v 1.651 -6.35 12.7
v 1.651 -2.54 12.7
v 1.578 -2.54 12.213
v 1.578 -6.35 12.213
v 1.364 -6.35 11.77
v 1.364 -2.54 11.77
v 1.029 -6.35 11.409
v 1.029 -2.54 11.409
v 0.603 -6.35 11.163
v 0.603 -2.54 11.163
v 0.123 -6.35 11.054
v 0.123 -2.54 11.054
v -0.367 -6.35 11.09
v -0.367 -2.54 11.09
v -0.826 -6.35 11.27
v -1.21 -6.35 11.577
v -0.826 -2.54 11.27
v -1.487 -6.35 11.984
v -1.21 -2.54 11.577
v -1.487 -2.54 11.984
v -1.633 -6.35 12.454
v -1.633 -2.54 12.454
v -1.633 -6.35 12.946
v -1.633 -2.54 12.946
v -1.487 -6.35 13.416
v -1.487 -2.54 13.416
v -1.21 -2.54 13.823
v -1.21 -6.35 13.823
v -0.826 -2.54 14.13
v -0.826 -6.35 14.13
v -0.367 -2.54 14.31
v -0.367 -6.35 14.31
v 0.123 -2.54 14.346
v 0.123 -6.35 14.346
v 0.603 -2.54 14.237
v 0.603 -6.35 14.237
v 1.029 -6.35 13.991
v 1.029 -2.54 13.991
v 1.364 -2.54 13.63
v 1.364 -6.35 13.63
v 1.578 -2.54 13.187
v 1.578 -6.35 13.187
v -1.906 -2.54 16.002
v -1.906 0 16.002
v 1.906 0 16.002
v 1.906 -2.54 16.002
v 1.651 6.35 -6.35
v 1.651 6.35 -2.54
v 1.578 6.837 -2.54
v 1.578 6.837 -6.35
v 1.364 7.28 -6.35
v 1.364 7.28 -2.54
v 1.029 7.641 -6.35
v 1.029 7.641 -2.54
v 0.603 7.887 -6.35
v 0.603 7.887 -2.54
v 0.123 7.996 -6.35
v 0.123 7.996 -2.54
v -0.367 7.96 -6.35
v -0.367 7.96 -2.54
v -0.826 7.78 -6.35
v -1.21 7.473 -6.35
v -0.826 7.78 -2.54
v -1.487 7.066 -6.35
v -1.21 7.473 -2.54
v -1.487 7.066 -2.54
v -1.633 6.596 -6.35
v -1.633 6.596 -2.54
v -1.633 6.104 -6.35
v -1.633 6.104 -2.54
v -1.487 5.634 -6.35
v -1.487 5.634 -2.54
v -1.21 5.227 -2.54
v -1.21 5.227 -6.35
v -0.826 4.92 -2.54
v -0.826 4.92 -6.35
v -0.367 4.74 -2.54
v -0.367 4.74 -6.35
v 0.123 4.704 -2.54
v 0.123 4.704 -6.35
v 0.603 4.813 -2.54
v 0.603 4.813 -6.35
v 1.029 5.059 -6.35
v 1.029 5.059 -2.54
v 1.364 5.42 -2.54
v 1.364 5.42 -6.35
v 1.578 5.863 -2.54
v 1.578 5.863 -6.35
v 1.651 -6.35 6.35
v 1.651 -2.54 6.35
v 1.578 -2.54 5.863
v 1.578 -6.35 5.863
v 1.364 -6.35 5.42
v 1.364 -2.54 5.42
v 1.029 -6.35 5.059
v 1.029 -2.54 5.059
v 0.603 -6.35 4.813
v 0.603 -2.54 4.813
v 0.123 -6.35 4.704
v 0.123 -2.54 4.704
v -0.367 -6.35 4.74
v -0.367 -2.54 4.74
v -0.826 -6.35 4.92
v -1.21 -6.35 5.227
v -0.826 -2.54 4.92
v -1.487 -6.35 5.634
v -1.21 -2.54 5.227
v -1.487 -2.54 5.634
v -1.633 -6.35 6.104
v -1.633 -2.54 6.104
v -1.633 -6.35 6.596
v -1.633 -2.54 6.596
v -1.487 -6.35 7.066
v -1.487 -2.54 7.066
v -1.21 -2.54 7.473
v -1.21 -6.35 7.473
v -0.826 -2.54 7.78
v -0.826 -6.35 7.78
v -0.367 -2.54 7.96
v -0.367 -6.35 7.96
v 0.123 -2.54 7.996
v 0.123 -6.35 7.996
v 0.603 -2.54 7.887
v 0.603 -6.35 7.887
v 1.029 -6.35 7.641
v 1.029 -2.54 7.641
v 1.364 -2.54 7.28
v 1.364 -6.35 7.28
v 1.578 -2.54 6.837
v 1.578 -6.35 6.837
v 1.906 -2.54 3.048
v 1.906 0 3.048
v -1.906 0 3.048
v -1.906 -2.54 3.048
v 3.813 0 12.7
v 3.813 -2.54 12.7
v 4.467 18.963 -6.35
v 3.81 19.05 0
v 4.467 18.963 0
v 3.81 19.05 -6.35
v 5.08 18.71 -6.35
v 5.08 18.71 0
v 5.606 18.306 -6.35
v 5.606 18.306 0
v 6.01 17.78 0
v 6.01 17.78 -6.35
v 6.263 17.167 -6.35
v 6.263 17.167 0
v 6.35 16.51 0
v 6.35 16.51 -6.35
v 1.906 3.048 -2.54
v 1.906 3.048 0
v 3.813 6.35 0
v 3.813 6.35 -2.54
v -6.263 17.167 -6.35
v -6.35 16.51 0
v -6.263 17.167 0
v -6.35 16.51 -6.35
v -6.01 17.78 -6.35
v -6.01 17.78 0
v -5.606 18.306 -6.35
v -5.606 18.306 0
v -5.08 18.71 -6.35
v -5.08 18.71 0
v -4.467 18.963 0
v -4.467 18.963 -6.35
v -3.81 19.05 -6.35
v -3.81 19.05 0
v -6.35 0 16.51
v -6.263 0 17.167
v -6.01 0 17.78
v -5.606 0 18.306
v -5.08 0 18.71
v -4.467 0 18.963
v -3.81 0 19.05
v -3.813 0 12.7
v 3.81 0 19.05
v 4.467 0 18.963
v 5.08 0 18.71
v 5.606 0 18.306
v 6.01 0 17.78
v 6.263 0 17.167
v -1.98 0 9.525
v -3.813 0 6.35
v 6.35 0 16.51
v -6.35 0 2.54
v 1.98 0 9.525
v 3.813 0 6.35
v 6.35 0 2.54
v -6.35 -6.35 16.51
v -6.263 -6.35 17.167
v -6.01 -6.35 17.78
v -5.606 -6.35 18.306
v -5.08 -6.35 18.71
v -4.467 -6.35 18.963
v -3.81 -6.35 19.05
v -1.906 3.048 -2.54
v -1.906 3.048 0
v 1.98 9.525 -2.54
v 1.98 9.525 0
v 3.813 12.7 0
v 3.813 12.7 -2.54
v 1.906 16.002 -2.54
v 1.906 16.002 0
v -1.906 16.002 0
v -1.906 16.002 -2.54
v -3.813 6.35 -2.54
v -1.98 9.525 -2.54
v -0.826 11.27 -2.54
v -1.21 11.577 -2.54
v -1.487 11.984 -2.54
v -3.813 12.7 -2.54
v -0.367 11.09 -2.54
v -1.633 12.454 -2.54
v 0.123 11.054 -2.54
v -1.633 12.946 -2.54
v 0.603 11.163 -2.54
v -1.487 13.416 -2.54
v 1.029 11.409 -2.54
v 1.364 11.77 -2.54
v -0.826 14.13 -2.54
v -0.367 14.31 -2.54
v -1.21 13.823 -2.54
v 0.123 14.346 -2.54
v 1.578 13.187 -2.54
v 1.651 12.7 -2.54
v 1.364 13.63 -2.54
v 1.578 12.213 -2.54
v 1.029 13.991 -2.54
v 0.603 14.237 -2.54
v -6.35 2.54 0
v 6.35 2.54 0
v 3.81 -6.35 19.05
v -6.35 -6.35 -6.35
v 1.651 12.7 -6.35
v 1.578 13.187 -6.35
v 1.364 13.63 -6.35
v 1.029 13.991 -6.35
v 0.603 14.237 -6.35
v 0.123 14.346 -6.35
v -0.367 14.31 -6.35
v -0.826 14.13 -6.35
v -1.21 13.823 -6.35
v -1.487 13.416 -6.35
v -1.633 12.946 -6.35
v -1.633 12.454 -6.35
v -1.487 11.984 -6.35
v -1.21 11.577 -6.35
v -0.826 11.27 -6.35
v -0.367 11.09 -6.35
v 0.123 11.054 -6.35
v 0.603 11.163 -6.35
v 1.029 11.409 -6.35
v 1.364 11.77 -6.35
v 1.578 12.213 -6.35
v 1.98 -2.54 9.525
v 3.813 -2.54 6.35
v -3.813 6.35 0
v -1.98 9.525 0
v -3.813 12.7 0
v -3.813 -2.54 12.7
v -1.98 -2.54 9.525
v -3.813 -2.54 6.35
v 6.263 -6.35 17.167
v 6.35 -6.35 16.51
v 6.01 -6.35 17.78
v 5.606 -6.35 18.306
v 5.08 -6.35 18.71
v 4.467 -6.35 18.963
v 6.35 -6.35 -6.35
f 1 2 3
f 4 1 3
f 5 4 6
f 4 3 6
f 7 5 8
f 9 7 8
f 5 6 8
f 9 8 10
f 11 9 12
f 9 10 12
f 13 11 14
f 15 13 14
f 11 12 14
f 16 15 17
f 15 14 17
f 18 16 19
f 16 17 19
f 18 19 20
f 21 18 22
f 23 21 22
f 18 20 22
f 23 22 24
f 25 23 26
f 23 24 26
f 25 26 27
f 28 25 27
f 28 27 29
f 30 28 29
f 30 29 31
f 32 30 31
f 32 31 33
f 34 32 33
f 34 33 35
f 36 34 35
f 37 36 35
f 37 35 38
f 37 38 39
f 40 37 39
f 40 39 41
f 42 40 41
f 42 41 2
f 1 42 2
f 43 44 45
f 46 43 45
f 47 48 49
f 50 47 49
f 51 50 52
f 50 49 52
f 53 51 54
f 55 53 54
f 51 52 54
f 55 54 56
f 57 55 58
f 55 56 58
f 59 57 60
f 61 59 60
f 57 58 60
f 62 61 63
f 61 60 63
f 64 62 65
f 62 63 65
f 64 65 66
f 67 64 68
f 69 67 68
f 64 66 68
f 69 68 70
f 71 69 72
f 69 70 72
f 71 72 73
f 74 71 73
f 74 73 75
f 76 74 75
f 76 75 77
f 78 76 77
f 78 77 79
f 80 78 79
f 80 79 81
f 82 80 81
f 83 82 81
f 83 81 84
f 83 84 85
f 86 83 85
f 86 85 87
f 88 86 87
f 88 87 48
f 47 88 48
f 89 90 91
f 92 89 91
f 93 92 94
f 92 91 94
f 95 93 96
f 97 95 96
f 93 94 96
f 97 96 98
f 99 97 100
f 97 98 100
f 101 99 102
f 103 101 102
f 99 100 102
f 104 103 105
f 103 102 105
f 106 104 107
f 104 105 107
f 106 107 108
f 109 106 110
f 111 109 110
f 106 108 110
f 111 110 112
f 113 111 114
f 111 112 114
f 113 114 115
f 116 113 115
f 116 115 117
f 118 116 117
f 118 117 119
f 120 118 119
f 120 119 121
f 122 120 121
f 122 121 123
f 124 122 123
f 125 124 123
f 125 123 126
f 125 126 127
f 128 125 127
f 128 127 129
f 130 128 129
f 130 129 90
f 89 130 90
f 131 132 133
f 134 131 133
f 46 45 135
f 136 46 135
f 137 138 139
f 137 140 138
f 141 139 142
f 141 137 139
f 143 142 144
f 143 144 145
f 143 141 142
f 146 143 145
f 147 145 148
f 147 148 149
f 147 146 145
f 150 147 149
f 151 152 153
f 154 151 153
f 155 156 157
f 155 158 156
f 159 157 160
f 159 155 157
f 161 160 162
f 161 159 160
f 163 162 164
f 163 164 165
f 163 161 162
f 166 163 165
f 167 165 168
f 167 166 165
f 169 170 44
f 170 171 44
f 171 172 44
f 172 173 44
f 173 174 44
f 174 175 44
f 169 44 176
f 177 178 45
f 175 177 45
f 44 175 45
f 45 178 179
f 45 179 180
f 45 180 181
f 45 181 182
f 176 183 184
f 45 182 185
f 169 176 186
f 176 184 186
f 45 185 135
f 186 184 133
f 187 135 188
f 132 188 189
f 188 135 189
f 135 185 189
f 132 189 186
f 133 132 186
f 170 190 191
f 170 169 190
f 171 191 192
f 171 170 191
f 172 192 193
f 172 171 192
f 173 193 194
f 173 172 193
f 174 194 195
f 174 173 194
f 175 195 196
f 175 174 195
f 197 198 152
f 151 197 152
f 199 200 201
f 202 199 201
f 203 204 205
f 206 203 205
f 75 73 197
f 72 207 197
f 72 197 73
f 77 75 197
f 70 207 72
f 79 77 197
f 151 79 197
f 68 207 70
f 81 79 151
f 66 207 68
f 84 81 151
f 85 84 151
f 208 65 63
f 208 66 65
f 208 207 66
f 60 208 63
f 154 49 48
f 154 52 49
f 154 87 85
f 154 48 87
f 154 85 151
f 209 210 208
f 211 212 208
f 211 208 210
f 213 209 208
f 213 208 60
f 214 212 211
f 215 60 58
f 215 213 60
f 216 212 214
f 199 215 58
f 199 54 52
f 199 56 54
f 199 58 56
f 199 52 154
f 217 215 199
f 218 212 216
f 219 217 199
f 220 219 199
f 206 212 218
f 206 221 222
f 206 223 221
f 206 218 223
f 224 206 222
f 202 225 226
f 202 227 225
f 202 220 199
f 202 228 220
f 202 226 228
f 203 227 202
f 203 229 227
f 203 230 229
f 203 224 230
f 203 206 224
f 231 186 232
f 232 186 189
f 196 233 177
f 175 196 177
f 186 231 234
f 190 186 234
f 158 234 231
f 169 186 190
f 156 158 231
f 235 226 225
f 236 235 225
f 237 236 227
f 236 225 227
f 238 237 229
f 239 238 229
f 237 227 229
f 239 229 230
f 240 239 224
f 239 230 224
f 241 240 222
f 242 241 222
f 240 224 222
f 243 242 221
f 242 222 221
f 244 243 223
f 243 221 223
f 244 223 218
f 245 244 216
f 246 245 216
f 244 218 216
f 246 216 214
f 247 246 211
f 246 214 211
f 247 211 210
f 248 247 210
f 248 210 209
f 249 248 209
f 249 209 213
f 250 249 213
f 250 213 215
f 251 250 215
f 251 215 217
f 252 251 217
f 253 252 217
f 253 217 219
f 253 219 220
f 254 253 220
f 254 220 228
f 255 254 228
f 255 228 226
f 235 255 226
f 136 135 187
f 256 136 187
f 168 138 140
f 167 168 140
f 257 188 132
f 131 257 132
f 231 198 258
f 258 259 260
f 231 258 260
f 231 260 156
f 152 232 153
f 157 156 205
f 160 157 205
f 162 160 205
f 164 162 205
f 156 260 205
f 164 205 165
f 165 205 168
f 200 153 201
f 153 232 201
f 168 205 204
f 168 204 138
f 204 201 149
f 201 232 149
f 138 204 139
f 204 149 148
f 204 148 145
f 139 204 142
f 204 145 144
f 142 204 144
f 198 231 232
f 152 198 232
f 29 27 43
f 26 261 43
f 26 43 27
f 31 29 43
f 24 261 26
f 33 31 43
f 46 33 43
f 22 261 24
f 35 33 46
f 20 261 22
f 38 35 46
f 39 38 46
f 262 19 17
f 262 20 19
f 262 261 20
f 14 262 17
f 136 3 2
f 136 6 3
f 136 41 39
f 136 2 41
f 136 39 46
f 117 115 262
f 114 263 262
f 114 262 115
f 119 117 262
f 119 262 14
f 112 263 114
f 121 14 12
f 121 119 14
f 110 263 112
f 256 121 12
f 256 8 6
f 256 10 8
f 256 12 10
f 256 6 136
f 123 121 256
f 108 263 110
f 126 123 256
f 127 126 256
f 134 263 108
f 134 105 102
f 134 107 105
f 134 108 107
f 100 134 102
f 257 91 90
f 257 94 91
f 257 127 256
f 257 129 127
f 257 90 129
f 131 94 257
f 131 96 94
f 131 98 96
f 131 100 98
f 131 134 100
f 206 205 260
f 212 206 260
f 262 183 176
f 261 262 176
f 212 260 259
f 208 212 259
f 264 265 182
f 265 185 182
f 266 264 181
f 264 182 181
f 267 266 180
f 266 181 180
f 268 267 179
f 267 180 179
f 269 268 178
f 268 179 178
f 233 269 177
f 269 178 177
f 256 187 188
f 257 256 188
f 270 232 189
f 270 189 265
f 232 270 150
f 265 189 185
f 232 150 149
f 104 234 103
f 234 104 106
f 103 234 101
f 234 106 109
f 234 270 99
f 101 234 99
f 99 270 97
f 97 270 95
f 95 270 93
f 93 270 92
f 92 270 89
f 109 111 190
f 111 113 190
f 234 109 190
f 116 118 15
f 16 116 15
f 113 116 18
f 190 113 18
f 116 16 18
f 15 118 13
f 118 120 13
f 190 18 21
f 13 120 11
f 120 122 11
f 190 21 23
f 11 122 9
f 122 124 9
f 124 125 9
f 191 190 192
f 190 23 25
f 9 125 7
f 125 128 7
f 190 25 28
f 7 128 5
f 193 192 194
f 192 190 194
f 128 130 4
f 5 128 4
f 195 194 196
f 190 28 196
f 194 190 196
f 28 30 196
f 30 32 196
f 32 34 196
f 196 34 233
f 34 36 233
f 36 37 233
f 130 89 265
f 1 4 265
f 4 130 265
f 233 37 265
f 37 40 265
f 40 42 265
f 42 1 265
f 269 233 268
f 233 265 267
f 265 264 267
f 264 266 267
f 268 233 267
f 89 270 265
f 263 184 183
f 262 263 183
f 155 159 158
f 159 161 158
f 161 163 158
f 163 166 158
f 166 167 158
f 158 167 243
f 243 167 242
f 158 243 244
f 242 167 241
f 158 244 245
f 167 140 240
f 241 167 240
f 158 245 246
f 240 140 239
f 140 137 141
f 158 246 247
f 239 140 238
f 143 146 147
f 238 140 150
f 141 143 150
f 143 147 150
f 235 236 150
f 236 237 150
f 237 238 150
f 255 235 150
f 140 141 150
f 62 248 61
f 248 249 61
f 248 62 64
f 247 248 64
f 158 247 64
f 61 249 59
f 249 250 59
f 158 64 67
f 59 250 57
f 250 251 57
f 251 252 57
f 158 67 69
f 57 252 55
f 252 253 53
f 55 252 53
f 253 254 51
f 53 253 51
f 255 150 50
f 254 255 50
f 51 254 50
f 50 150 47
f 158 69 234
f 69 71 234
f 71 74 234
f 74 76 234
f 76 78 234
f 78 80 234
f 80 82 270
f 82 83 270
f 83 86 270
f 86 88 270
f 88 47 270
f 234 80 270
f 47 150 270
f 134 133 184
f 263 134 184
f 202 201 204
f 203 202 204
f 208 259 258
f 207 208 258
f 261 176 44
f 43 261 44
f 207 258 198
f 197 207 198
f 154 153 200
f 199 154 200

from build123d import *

# Parameters (mm, degrees)
BOSS_EXTRUDE1_DEPTH      = 6.35
BOSS_EXTRUDE1_DEPTH_BACK = 6.35
SKETCH2_R                = 1.651
CUT_EXTRUDE1_DEPTH       = 25.4
CUT_EXTRUDE2_DEPTH       = 2.54
SKETCH4_R                = 1.651
CUT_EXTRUDE3_DEPTH       = 6.35
CUT_EXTRUDE4_DEPTH       = 2.54
CHAMFER1_SIZE            = 2.54
FILLET1_R                = 2.54


with BuildPart() as part:
    # Sketch1 → Boss-Extrude1 (new, two sides: drawn at the far end of the back side and taken through both)
    with BuildSketch(Plane(origin=(0, 0, 0), x_dir=(0, 0, -1), z_dir=(1, 0, 0)).offset(-BOSS_EXTRUDE1_DEPTH_BACK)):
        Polygon((0, 0), (0, 19.05), (6.35, 19.05), (6.35, -6.35), (-19.05, -6.35), (-19.05, 0), align=None)
    extrude(amount=BOSS_EXTRUDE1_DEPTH + BOSS_EXTRUDE1_DEPTH_BACK)

    # Sketch2 → Cut-Extrude1 (cut)
    with BuildSketch(Plane(origin=(0, 0, 0), x_dir=(1, 0, 0), z_dir=(0, 1, 0))):
        with Locations((0, -6.35)):
            Circle(SKETCH2_R)
        with Locations((0, -12.7)):
            Circle(SKETCH2_R)
    extrude(amount=-CUT_EXTRUDE1_DEPTH, mode=Mode.SUBTRACT)

    # Sketch3 → Cut-Extrude2 (cut)
    with BuildSketch(Plane(origin=(0, 0, 0), x_dir=(1, 0, 0), z_dir=(0, 1, 0))):
        Polygon((1.906410589, -3.048), (-1.906410589, -3.048), (-3.812821178, -6.35), (-1.979734073, -9.525), (-3.812821178, -12.7), (-1.906410589, -16.002), (1.906410589, -16.002), (3.812821178, -12.7), (1.979734073, -9.525), (3.812821178, -6.35), align=None)
    extrude(amount=-CUT_EXTRUDE2_DEPTH, mode=Mode.SUBTRACT)

    # Sketch4 → Cut-Extrude3 (cut)
    with BuildSketch(Plane.XY):
        with Locations((0, 12.7)):
            Circle(SKETCH4_R)
        with Locations((0, 6.35)):
            Circle(SKETCH4_R)
    extrude(amount=-CUT_EXTRUDE3_DEPTH, mode=Mode.SUBTRACT)

    # Sketch5 → Cut-Extrude4 (cut)
    with BuildSketch(Plane.XY):
        Polygon((1.906410589, 16.002), (-1.906410589, 16.002), (-3.812821178, 12.7), (-1.979734073, 9.525), (-3.812821178, 6.35), (-1.906410589, 3.048), (1.906410589, 3.048), (3.812821178, 6.35), (1.979734073, 9.525), (3.812821178, 12.7), align=None)
    extrude(amount=-CUT_EXTRUDE4_DEPTH, mode=Mode.SUBTRACT)

    # Chamfer1
    chamfer1_edges = [part.edges().sort_by_distance(p)[0] for p in [
        (0, 0, 0),
    ]]
    chamfer(chamfer1_edges, length=CHAMFER1_SIZE)

    # Fillet1
    fillet1_edges = [part.edges().sort_by_distance(p)[0] for p in [
        (-6.35, -3.175, 19.05),
        (6.35, -3.175, 19.05),
        (6.35, 19.05, -3.175),
        (-6.35, 19.05, -3.175),
    ]]
    fillet(fillet1_edges, radius=FILLET1_R)


solid = part.part
